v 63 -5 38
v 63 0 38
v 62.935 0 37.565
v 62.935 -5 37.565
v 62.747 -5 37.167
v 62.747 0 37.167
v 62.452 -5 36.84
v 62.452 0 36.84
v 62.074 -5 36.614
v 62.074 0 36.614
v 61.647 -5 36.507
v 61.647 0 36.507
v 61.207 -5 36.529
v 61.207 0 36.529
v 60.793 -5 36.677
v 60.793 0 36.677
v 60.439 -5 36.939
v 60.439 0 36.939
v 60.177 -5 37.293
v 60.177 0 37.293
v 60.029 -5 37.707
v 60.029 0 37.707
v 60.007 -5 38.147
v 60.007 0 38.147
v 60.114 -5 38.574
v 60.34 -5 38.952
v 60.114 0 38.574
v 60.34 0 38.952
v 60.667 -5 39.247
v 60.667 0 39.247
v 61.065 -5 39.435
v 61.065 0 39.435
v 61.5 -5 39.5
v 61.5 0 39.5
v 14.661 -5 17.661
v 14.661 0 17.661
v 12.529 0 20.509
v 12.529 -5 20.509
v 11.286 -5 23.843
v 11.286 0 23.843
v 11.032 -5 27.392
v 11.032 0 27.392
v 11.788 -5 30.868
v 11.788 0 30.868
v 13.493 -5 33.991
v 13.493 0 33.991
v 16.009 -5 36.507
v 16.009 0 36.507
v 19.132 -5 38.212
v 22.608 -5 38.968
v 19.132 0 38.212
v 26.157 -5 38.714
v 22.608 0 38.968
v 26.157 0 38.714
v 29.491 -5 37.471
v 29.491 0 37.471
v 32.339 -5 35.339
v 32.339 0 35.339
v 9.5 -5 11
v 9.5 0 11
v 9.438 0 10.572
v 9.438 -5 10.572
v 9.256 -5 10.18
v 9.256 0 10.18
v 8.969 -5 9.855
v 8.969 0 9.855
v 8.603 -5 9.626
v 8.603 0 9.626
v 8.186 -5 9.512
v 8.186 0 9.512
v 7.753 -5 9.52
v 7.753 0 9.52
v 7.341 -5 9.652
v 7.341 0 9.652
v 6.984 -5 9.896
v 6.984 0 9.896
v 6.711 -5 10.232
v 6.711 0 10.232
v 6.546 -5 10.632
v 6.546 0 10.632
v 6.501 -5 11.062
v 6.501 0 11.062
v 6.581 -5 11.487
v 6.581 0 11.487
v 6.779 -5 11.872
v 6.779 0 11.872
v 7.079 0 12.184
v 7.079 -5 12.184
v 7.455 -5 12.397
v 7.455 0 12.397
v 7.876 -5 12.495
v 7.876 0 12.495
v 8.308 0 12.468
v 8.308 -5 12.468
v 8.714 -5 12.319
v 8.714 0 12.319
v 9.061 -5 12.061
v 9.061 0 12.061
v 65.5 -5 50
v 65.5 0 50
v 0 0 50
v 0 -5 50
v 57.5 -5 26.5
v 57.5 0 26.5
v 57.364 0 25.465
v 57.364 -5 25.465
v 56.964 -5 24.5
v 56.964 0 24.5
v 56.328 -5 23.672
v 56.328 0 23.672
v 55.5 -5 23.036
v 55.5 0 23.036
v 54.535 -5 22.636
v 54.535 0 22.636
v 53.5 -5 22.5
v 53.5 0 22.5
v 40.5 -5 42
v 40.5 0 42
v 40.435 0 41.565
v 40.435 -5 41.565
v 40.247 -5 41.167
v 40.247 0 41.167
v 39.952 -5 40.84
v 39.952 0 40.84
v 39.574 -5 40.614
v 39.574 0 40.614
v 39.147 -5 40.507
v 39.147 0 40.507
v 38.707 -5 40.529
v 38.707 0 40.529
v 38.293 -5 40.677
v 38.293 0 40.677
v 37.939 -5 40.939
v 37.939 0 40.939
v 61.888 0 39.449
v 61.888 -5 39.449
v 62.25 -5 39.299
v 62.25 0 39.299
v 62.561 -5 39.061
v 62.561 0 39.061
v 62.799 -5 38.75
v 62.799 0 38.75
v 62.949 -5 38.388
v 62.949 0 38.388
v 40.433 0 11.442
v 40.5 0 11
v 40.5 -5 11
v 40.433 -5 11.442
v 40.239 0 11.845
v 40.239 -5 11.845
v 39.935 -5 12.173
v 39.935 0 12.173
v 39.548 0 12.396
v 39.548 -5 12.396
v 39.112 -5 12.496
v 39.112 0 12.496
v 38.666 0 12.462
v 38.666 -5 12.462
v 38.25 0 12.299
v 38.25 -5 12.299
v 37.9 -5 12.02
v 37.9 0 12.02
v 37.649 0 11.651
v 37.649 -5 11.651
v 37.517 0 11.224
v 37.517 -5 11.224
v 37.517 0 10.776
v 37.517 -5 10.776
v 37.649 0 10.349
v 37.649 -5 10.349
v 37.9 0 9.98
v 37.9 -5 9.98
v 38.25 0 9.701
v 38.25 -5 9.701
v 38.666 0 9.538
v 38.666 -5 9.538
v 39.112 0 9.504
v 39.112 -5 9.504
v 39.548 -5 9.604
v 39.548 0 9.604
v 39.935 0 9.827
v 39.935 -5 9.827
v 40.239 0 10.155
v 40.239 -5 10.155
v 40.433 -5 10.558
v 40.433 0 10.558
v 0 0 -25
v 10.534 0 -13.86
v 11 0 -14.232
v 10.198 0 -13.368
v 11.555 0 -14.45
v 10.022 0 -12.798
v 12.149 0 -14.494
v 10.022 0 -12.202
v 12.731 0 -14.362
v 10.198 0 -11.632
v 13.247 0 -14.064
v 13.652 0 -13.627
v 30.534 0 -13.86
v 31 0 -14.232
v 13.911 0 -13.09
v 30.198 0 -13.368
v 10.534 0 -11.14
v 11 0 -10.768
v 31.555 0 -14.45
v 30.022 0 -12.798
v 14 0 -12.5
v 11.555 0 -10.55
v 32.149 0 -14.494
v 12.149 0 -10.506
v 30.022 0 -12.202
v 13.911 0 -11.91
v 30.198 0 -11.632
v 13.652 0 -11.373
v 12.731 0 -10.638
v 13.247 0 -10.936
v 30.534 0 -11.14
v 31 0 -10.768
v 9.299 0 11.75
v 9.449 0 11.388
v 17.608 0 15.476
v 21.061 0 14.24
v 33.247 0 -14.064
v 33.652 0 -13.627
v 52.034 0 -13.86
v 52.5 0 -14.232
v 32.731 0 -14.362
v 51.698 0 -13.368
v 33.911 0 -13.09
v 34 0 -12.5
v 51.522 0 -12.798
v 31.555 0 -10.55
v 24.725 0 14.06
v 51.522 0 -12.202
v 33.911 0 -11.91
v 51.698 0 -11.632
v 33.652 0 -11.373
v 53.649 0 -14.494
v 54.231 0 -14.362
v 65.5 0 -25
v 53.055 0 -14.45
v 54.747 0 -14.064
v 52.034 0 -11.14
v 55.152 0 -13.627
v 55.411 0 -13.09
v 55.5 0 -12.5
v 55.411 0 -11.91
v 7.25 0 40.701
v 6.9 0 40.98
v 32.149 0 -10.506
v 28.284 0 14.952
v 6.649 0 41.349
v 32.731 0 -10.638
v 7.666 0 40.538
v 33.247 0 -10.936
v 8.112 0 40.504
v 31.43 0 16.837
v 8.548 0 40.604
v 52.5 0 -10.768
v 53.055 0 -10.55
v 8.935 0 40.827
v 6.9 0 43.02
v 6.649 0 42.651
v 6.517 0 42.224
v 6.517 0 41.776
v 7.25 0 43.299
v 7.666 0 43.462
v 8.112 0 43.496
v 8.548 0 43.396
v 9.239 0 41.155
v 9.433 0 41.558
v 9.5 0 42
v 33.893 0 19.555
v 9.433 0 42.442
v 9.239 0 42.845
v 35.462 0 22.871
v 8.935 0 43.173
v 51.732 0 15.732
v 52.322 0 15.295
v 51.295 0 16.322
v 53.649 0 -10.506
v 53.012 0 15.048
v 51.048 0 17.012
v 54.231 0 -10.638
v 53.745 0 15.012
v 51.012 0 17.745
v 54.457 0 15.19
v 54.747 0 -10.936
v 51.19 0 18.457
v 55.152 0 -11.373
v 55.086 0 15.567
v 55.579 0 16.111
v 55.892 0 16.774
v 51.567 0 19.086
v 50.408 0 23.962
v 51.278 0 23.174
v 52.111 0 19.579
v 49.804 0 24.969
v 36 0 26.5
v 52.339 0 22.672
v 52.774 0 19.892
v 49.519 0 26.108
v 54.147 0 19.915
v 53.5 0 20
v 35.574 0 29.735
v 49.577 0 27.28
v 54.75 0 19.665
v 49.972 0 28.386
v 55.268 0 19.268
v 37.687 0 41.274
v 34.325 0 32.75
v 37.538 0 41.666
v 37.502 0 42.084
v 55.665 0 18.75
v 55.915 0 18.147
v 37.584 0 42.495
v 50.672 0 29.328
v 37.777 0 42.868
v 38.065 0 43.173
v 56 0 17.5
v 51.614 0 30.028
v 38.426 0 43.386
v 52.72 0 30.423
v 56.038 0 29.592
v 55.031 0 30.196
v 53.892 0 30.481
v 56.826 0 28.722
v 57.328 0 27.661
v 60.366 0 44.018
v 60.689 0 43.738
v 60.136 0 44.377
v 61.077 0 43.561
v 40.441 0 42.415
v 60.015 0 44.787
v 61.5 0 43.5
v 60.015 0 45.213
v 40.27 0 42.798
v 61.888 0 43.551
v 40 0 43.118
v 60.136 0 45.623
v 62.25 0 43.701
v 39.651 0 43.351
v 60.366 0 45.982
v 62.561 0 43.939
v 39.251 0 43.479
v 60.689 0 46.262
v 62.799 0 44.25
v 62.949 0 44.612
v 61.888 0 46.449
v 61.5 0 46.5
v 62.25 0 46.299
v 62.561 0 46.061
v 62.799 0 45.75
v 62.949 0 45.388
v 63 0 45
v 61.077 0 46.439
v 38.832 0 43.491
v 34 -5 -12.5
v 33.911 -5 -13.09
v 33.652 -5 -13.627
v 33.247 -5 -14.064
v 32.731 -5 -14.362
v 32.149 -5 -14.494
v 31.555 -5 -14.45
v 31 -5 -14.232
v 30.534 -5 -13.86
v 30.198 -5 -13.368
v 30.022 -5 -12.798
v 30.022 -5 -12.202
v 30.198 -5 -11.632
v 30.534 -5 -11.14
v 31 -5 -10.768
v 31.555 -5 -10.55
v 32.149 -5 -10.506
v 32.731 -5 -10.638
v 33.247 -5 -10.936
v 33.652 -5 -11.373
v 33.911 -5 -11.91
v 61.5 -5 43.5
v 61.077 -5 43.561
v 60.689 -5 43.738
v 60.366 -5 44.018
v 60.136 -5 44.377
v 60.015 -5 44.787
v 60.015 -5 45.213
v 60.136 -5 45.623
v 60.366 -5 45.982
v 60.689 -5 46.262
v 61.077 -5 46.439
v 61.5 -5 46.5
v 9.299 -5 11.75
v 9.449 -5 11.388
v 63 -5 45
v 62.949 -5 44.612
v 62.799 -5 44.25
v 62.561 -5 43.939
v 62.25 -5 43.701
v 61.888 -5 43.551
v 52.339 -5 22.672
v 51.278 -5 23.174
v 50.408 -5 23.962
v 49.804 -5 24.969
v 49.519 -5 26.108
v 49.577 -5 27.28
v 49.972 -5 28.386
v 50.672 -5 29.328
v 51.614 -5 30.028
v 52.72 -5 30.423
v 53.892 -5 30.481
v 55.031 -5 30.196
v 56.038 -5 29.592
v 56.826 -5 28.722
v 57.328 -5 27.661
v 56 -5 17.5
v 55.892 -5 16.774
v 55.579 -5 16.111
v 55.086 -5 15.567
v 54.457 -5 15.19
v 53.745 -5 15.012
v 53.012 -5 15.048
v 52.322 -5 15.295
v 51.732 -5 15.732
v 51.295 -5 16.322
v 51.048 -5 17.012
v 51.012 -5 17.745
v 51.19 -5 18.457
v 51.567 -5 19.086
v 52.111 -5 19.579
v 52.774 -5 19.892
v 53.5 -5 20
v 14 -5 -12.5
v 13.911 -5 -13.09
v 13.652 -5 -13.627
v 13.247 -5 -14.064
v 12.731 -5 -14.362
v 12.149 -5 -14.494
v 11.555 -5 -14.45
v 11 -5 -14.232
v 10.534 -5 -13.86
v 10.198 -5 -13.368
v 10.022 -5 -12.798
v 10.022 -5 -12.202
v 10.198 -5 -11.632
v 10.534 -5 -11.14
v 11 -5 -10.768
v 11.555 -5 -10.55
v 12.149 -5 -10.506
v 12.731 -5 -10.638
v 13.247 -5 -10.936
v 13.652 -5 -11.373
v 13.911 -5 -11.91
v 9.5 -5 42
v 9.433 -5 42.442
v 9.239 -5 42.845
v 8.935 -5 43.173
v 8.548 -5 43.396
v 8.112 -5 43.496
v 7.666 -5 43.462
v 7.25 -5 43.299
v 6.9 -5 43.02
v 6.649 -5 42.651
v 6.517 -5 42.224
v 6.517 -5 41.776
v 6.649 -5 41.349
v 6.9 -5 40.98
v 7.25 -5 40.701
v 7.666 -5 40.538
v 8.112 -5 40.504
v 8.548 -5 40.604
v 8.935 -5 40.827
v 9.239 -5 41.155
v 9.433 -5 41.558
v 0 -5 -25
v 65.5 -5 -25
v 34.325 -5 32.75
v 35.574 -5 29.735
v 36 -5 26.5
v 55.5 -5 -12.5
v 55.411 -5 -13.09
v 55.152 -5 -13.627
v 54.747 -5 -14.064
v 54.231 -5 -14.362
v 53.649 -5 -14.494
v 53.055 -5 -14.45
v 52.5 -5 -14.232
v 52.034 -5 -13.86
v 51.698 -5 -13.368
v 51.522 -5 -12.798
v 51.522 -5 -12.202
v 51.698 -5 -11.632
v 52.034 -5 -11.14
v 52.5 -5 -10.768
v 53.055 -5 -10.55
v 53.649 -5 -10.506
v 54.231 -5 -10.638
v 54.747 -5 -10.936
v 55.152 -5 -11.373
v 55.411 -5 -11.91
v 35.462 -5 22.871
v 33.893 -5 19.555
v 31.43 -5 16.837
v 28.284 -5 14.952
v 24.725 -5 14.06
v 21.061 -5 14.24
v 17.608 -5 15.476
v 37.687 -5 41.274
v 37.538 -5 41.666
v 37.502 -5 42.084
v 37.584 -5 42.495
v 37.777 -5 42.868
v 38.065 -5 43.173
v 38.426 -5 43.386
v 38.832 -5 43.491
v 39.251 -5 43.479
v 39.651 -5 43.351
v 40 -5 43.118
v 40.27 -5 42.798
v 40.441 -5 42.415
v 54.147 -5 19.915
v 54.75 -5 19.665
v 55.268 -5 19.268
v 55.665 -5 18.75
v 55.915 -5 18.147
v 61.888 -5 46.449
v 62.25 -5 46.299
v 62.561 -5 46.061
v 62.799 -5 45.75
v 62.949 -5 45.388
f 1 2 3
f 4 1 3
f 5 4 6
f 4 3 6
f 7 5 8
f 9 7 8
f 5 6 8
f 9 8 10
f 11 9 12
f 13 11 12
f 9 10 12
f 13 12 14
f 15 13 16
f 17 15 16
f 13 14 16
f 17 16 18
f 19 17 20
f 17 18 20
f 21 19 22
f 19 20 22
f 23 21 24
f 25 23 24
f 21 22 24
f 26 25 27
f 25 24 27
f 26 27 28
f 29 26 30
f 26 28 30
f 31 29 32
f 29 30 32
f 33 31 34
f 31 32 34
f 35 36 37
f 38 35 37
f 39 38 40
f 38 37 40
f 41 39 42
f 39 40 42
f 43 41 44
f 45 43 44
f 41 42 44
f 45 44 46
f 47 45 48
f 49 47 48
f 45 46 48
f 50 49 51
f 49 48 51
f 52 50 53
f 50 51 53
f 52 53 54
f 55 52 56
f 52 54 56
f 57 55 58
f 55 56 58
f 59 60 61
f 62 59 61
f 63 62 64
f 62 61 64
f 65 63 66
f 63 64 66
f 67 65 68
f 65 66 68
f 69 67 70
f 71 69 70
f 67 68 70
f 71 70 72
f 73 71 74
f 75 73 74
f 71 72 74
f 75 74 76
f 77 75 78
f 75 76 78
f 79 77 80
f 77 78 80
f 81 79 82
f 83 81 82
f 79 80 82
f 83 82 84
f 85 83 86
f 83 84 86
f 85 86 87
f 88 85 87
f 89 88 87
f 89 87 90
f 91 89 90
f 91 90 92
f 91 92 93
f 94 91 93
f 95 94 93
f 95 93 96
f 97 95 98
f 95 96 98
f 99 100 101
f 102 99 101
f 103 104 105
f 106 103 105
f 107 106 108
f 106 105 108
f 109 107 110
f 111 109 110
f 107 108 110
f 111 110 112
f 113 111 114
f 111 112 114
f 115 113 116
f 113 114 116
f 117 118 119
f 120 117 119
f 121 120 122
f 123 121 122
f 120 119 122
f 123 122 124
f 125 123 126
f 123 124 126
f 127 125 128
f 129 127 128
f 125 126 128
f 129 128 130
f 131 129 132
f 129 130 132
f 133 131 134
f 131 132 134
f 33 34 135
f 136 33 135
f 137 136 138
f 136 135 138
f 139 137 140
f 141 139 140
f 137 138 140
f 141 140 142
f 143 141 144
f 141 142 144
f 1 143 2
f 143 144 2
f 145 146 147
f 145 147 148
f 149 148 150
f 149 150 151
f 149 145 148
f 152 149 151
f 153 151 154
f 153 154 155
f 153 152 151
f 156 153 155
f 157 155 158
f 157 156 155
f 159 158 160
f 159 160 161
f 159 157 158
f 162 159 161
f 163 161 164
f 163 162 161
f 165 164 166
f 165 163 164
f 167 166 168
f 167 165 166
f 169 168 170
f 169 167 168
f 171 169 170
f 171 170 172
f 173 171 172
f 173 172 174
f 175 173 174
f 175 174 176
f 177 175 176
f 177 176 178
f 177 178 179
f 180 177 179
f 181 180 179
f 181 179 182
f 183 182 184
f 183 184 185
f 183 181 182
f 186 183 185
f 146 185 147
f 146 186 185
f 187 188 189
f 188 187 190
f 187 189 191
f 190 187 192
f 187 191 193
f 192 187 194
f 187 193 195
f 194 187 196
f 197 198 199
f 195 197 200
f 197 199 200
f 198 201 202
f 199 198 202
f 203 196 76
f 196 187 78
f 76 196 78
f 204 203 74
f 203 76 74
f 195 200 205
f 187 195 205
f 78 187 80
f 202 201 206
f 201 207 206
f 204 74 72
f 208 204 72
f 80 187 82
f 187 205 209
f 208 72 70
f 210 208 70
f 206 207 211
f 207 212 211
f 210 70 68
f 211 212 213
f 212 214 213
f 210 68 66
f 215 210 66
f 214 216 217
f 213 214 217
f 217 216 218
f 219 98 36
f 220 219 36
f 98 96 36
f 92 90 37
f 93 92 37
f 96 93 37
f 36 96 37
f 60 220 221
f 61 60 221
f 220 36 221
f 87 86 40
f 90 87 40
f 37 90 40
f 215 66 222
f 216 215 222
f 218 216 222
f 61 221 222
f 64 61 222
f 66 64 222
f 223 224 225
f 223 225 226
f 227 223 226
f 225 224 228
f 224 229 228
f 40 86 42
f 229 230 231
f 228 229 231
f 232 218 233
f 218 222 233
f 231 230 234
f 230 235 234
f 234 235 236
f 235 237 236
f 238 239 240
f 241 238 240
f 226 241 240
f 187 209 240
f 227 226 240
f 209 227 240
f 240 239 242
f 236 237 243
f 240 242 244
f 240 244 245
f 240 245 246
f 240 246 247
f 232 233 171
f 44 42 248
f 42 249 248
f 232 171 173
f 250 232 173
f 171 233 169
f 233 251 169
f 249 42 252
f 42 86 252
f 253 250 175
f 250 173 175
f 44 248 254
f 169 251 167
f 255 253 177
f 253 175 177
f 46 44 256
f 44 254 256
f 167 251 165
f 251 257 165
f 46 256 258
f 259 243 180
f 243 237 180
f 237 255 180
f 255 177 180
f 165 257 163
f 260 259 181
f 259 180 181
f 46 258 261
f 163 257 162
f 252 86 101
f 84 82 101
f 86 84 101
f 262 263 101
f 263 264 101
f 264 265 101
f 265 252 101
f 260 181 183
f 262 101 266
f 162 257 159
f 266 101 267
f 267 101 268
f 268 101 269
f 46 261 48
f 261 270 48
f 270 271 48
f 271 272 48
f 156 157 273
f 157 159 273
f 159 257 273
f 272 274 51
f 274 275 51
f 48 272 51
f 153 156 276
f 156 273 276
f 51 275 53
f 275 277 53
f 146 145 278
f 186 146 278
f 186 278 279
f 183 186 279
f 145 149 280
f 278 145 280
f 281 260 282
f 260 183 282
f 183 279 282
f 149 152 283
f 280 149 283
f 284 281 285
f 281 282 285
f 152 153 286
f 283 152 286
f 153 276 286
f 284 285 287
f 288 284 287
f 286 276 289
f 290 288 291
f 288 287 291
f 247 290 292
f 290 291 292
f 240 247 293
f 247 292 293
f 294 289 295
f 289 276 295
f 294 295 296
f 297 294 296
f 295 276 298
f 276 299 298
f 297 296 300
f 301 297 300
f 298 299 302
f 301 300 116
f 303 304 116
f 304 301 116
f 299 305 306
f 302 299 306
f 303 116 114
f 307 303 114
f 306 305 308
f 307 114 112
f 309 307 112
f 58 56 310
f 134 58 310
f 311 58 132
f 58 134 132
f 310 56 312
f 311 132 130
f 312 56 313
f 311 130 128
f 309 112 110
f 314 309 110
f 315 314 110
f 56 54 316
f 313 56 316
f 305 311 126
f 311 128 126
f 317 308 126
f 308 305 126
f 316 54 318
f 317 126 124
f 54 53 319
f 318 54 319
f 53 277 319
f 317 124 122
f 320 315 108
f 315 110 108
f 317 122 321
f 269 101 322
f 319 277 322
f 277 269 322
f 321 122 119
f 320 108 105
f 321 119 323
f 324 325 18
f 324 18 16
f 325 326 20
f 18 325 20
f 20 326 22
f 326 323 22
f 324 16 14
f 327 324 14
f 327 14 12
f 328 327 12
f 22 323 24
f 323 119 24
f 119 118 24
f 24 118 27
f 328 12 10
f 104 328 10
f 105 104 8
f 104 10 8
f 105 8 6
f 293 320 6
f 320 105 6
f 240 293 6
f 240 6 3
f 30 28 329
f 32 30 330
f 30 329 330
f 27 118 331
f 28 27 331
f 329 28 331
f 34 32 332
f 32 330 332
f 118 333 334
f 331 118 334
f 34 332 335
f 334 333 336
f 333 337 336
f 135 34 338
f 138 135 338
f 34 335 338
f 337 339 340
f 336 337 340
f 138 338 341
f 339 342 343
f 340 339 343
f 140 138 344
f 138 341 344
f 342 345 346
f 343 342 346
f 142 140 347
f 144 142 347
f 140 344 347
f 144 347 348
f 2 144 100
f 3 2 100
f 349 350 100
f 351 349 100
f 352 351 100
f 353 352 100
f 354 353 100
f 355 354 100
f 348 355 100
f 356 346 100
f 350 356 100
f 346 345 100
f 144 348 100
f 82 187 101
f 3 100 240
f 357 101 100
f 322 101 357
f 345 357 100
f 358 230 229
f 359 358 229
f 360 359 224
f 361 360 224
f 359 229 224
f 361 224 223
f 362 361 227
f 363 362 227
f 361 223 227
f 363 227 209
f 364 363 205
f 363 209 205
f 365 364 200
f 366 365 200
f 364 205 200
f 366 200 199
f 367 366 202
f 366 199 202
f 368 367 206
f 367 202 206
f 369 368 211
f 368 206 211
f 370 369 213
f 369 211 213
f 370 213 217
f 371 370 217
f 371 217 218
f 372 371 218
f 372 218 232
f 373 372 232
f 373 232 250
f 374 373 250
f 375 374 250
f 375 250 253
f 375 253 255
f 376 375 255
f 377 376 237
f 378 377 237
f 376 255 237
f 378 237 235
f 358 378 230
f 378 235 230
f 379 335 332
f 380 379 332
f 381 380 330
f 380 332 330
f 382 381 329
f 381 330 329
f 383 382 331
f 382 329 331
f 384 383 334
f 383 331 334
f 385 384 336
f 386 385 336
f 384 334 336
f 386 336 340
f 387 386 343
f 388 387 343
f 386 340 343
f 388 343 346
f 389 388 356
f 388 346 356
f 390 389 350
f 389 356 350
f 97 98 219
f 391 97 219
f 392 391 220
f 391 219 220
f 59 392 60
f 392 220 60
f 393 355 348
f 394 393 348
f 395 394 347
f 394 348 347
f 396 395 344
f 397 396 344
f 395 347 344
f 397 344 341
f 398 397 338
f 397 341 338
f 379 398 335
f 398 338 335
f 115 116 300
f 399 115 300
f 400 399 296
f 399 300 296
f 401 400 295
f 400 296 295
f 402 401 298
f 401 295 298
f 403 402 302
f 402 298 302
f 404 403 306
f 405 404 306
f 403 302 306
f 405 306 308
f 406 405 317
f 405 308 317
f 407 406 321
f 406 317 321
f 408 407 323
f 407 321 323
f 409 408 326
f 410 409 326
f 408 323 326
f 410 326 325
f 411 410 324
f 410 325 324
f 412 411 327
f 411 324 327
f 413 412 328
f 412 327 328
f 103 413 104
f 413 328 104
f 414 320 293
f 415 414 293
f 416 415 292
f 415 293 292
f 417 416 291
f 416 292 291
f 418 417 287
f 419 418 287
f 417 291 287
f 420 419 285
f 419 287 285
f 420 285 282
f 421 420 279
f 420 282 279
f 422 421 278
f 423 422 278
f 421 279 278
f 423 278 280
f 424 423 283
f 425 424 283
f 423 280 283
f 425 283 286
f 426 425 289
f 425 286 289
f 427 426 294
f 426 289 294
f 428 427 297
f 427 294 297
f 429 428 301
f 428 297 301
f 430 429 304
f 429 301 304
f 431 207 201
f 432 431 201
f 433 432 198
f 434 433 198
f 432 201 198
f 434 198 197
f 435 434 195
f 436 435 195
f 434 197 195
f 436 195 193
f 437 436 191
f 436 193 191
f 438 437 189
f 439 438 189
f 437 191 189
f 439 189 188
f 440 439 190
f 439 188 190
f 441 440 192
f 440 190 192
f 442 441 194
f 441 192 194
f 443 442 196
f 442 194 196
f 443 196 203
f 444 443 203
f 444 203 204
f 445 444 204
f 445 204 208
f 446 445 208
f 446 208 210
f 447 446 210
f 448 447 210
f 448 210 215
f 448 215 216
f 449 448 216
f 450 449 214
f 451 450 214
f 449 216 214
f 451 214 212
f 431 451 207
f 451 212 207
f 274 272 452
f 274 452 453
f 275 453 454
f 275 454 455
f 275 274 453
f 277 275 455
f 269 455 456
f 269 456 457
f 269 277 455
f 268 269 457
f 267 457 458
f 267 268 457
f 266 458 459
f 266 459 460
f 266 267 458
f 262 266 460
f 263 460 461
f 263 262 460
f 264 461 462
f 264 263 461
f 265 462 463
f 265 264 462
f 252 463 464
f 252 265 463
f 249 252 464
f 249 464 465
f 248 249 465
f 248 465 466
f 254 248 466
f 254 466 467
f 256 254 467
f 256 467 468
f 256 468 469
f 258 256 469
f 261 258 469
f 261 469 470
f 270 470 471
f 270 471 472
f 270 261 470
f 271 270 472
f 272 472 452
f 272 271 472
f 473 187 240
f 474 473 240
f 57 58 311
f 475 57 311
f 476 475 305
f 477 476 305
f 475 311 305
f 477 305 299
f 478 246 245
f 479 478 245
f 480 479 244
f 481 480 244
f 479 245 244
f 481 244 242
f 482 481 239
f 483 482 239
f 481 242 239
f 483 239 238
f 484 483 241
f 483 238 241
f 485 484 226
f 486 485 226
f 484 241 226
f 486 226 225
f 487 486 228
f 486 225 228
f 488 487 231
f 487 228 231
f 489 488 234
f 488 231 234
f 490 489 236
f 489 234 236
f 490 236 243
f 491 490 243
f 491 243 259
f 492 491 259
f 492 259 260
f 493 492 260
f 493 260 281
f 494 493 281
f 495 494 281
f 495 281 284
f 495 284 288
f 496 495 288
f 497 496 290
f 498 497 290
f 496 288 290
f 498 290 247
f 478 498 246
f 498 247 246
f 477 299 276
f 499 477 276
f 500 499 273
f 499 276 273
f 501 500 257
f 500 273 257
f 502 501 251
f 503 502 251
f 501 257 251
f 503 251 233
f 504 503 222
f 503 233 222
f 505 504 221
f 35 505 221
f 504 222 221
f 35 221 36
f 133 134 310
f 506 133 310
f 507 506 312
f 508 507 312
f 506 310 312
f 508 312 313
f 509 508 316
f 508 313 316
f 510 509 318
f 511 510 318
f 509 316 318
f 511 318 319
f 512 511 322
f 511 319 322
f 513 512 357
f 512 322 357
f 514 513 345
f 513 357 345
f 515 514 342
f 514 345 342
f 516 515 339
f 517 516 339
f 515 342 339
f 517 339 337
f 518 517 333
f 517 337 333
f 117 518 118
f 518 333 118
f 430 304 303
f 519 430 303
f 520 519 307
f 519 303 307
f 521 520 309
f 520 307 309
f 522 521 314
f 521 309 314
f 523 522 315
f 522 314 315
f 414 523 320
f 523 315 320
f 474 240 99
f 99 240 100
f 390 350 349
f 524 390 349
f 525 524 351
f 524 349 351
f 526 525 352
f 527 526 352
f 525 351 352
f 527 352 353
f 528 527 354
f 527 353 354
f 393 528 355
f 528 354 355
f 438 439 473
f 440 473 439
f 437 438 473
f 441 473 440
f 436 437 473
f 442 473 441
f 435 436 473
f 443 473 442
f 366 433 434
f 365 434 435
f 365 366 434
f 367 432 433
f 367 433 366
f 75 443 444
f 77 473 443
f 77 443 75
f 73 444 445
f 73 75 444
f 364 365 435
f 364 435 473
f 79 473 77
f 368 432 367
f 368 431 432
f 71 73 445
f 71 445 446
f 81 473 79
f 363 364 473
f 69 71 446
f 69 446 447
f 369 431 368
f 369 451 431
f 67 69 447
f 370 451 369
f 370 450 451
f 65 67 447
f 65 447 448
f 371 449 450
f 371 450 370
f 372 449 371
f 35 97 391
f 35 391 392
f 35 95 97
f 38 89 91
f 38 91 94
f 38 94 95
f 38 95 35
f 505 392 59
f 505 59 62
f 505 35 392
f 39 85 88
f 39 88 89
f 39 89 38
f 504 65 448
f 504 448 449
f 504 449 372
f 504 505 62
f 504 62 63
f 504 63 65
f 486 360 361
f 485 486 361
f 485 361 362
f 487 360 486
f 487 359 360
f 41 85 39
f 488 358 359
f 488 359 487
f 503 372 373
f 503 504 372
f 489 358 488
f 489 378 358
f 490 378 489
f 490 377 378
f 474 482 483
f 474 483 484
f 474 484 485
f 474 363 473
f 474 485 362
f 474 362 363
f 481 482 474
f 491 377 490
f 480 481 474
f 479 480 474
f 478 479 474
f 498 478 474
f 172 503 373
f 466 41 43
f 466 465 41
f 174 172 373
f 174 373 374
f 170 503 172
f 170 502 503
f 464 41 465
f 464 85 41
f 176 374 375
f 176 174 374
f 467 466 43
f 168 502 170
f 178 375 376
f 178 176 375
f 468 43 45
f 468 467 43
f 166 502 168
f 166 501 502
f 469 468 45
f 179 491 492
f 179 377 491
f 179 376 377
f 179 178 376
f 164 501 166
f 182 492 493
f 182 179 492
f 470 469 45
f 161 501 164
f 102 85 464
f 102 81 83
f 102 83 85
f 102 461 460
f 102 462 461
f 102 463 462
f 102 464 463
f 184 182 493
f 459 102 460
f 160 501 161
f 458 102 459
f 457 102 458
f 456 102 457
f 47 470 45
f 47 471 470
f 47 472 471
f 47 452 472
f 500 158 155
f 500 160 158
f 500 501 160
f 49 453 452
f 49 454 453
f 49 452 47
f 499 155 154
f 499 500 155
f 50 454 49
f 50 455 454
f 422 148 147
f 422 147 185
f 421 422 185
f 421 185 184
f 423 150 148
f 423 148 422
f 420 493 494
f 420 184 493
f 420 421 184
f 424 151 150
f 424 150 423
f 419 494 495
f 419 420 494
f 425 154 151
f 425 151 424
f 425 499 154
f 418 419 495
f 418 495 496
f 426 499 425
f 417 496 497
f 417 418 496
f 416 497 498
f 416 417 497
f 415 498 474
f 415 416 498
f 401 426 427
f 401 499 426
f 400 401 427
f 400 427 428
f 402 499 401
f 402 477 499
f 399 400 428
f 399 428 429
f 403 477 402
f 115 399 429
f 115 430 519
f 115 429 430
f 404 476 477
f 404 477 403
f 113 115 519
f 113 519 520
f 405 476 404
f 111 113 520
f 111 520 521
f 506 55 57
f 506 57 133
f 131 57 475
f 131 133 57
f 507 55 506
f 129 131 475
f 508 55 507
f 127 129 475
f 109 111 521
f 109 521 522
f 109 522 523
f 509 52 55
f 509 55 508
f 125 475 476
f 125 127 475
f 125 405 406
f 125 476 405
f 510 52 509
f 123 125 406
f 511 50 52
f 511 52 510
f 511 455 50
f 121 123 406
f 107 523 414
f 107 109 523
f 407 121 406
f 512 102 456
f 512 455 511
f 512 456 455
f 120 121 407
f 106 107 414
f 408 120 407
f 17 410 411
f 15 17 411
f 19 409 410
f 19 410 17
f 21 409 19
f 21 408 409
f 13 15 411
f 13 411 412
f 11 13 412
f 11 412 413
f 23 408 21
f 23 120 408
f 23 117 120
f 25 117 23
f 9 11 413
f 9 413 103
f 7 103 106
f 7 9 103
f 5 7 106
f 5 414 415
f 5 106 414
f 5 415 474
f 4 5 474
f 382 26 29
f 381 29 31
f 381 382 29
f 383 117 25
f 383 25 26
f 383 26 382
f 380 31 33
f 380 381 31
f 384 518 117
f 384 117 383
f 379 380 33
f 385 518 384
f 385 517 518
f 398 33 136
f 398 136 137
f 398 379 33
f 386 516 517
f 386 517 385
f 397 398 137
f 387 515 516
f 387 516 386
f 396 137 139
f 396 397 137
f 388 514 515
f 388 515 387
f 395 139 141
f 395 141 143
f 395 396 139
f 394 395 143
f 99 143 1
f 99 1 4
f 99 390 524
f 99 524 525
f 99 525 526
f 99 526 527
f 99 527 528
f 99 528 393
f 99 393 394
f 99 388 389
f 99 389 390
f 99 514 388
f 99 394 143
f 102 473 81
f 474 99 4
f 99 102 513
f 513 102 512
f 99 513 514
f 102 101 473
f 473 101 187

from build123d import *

# Parameters (mm, degrees)
F0_W     = 47
F0_H     = 50
F0_R     = 1.5
F1_DEPTH = 5


# Not quite as in the source:
# - a feature names something its author has since deleted; it is built from what else it names


with BuildPart() as f1:
    # F0 (on Front) → F1 (new body)
    with BuildSketch(Plane.XZ):
        with Locations((23.5, 25)):
            Rectangle(F0_W, F0_H)
        with BuildLine():
            ThreePointArc((9.5, 11), (6.6141807012, 10.4259748515), (9.0606601718, 12.0606601718))
            ThreePointArc((9.0606601718, 12.0606601718), (9.3858192988, 11.5740251485), (9.5, 11))
        make_face(mode=Mode.SUBTRACT)
        with Locations((39, 11)):
            Circle(F0_R, mode=Mode.SUBTRACT)
        with BuildLine():
            ThreePointArc((14.6611652352, 17.6611652352), (14.6611652352, 35.3388347648), (32.3388347648, 35.3388347648))
            ThreePointArc((32.3388347648, 35.3388347648), (35.0484941564, 31.2835429046), (36, 26.5))
            ThreePointArc((36, 26.5), (28.2835429046, 14.9515058436), (14.6611652352, 17.6611652352))
        make_face(mode=Mode.SUBTRACT)
        with Locations((8, 42)):
            Circle(F0_R, mode=Mode.SUBTRACT)
        with BuildLine():
            ThreePointArc((37.9393398282, 40.9393398282), (38.4259748515, 43.3858192988), (40.5, 42))
            ThreePointArc((40.5, 42), (39.5740251485, 40.6141807012), (37.9393398282, 40.9393398282))
        make_face(mode=Mode.SUBTRACT)
        with BuildLine():
            Line((47, 50), (47, 0))
            Line((47, 0), (47, -12.5))
            Line((47, -12.5), (51.5, -12.5))
            ThreePointArc((51.5, -12.5), (53.5, -10.5), (55.5, -12.5))
            Line((55.5, -12.5), (65.5, -12.5))
            Line((65.5, -12.5), (65.5, 26.5))
            Line((65.5, 26.5), (65.5, 50))
            Line((65.5, 50), (61.5, 50))
            Line((61.5, 50), (47, 50))
        make_face()
        with BuildLine():
            ThreePointArc((56, 17.5), (51.732233047, 15.732233047), (53.5, 20))
            ThreePointArc((53.5, 20), (55.267766953, 19.267766953), (56, 17.5))
        make_face(mode=Mode.SUBTRACT)
        with BuildLine():
            ThreePointArc((53.5, 22.5), (50.6715728753, 29.3284271247), (57.5, 26.5))
            ThreePointArc((57.5, 26.5), (56.3284271247, 23.6715728753), (53.5, 22.5))
        make_face(mode=Mode.SUBTRACT)
        with BuildLine():
            ThreePointArc((63, 38), (60.4393398282, 36.9393398282), (61.5, 39.5))
            ThreePointArc((61.5, 39.5), (62.5606601718, 39.0606601718), (63, 38))
        make_face(mode=Mode.SUBTRACT)
        with BuildLine():
            ThreePointArc((61.5, 43.5), (60, 45), (61.5, 46.5))
            ThreePointArc((61.5, 46.5), (62.5606601718, 46.0606601718), (63, 45))
            ThreePointArc((63, 45), (62.5606601718, 43.9393398282), (61.5, 43.5))
        make_face(mode=Mode.SUBTRACT)
        with BuildLine():
            Line((47, 0), (0, 0))
            Line((0, 0), (0, -12.5))
            Line((0, -12.5), (10, -12.5))
            ThreePointArc((10, -12.5), (12, -10.5), (14, -12.5))
            Line((14, -12.5), (30, -12.5))
            ThreePointArc((30, -12.5), (32, -10.5), (34, -12.5))
            Line((34, -12.5), (47, -12.5))
            Line((47, -12.5), (47, 0))
        make_face()
        with BuildLine():
            Line((10, -12.5), (0, -12.5))
            Line((0, -12.5), (0, -25))
            Line((0, -25), (47, -25))
            Line((47, -25), (47, -12.5))
            Line((47, -12.5), (34, -12.5))
            ThreePointArc((34, -12.5), (32, -14.5), (30, -12.5))
            Line((30, -12.5), (14, -12.5))
            ThreePointArc((14, -12.5), (12, -14.5), (10, -12.5))
        make_face()
        with BuildLine():
            Line((51.5, -12.5), (47, -12.5))
            Line((47, -12.5), (47, -25))
            Line((47, -25), (65.5, -25))
            Line((65.5, -25), (65.5, -12.5))
            Line((65.5, -12.5), (55.5, -12.5))
            ThreePointArc((55.5, -12.5), (53.5, -14.5), (51.5, -12.5))
        make_face()
    extrude(amount=F1_DEPTH)


solid = f1.part
